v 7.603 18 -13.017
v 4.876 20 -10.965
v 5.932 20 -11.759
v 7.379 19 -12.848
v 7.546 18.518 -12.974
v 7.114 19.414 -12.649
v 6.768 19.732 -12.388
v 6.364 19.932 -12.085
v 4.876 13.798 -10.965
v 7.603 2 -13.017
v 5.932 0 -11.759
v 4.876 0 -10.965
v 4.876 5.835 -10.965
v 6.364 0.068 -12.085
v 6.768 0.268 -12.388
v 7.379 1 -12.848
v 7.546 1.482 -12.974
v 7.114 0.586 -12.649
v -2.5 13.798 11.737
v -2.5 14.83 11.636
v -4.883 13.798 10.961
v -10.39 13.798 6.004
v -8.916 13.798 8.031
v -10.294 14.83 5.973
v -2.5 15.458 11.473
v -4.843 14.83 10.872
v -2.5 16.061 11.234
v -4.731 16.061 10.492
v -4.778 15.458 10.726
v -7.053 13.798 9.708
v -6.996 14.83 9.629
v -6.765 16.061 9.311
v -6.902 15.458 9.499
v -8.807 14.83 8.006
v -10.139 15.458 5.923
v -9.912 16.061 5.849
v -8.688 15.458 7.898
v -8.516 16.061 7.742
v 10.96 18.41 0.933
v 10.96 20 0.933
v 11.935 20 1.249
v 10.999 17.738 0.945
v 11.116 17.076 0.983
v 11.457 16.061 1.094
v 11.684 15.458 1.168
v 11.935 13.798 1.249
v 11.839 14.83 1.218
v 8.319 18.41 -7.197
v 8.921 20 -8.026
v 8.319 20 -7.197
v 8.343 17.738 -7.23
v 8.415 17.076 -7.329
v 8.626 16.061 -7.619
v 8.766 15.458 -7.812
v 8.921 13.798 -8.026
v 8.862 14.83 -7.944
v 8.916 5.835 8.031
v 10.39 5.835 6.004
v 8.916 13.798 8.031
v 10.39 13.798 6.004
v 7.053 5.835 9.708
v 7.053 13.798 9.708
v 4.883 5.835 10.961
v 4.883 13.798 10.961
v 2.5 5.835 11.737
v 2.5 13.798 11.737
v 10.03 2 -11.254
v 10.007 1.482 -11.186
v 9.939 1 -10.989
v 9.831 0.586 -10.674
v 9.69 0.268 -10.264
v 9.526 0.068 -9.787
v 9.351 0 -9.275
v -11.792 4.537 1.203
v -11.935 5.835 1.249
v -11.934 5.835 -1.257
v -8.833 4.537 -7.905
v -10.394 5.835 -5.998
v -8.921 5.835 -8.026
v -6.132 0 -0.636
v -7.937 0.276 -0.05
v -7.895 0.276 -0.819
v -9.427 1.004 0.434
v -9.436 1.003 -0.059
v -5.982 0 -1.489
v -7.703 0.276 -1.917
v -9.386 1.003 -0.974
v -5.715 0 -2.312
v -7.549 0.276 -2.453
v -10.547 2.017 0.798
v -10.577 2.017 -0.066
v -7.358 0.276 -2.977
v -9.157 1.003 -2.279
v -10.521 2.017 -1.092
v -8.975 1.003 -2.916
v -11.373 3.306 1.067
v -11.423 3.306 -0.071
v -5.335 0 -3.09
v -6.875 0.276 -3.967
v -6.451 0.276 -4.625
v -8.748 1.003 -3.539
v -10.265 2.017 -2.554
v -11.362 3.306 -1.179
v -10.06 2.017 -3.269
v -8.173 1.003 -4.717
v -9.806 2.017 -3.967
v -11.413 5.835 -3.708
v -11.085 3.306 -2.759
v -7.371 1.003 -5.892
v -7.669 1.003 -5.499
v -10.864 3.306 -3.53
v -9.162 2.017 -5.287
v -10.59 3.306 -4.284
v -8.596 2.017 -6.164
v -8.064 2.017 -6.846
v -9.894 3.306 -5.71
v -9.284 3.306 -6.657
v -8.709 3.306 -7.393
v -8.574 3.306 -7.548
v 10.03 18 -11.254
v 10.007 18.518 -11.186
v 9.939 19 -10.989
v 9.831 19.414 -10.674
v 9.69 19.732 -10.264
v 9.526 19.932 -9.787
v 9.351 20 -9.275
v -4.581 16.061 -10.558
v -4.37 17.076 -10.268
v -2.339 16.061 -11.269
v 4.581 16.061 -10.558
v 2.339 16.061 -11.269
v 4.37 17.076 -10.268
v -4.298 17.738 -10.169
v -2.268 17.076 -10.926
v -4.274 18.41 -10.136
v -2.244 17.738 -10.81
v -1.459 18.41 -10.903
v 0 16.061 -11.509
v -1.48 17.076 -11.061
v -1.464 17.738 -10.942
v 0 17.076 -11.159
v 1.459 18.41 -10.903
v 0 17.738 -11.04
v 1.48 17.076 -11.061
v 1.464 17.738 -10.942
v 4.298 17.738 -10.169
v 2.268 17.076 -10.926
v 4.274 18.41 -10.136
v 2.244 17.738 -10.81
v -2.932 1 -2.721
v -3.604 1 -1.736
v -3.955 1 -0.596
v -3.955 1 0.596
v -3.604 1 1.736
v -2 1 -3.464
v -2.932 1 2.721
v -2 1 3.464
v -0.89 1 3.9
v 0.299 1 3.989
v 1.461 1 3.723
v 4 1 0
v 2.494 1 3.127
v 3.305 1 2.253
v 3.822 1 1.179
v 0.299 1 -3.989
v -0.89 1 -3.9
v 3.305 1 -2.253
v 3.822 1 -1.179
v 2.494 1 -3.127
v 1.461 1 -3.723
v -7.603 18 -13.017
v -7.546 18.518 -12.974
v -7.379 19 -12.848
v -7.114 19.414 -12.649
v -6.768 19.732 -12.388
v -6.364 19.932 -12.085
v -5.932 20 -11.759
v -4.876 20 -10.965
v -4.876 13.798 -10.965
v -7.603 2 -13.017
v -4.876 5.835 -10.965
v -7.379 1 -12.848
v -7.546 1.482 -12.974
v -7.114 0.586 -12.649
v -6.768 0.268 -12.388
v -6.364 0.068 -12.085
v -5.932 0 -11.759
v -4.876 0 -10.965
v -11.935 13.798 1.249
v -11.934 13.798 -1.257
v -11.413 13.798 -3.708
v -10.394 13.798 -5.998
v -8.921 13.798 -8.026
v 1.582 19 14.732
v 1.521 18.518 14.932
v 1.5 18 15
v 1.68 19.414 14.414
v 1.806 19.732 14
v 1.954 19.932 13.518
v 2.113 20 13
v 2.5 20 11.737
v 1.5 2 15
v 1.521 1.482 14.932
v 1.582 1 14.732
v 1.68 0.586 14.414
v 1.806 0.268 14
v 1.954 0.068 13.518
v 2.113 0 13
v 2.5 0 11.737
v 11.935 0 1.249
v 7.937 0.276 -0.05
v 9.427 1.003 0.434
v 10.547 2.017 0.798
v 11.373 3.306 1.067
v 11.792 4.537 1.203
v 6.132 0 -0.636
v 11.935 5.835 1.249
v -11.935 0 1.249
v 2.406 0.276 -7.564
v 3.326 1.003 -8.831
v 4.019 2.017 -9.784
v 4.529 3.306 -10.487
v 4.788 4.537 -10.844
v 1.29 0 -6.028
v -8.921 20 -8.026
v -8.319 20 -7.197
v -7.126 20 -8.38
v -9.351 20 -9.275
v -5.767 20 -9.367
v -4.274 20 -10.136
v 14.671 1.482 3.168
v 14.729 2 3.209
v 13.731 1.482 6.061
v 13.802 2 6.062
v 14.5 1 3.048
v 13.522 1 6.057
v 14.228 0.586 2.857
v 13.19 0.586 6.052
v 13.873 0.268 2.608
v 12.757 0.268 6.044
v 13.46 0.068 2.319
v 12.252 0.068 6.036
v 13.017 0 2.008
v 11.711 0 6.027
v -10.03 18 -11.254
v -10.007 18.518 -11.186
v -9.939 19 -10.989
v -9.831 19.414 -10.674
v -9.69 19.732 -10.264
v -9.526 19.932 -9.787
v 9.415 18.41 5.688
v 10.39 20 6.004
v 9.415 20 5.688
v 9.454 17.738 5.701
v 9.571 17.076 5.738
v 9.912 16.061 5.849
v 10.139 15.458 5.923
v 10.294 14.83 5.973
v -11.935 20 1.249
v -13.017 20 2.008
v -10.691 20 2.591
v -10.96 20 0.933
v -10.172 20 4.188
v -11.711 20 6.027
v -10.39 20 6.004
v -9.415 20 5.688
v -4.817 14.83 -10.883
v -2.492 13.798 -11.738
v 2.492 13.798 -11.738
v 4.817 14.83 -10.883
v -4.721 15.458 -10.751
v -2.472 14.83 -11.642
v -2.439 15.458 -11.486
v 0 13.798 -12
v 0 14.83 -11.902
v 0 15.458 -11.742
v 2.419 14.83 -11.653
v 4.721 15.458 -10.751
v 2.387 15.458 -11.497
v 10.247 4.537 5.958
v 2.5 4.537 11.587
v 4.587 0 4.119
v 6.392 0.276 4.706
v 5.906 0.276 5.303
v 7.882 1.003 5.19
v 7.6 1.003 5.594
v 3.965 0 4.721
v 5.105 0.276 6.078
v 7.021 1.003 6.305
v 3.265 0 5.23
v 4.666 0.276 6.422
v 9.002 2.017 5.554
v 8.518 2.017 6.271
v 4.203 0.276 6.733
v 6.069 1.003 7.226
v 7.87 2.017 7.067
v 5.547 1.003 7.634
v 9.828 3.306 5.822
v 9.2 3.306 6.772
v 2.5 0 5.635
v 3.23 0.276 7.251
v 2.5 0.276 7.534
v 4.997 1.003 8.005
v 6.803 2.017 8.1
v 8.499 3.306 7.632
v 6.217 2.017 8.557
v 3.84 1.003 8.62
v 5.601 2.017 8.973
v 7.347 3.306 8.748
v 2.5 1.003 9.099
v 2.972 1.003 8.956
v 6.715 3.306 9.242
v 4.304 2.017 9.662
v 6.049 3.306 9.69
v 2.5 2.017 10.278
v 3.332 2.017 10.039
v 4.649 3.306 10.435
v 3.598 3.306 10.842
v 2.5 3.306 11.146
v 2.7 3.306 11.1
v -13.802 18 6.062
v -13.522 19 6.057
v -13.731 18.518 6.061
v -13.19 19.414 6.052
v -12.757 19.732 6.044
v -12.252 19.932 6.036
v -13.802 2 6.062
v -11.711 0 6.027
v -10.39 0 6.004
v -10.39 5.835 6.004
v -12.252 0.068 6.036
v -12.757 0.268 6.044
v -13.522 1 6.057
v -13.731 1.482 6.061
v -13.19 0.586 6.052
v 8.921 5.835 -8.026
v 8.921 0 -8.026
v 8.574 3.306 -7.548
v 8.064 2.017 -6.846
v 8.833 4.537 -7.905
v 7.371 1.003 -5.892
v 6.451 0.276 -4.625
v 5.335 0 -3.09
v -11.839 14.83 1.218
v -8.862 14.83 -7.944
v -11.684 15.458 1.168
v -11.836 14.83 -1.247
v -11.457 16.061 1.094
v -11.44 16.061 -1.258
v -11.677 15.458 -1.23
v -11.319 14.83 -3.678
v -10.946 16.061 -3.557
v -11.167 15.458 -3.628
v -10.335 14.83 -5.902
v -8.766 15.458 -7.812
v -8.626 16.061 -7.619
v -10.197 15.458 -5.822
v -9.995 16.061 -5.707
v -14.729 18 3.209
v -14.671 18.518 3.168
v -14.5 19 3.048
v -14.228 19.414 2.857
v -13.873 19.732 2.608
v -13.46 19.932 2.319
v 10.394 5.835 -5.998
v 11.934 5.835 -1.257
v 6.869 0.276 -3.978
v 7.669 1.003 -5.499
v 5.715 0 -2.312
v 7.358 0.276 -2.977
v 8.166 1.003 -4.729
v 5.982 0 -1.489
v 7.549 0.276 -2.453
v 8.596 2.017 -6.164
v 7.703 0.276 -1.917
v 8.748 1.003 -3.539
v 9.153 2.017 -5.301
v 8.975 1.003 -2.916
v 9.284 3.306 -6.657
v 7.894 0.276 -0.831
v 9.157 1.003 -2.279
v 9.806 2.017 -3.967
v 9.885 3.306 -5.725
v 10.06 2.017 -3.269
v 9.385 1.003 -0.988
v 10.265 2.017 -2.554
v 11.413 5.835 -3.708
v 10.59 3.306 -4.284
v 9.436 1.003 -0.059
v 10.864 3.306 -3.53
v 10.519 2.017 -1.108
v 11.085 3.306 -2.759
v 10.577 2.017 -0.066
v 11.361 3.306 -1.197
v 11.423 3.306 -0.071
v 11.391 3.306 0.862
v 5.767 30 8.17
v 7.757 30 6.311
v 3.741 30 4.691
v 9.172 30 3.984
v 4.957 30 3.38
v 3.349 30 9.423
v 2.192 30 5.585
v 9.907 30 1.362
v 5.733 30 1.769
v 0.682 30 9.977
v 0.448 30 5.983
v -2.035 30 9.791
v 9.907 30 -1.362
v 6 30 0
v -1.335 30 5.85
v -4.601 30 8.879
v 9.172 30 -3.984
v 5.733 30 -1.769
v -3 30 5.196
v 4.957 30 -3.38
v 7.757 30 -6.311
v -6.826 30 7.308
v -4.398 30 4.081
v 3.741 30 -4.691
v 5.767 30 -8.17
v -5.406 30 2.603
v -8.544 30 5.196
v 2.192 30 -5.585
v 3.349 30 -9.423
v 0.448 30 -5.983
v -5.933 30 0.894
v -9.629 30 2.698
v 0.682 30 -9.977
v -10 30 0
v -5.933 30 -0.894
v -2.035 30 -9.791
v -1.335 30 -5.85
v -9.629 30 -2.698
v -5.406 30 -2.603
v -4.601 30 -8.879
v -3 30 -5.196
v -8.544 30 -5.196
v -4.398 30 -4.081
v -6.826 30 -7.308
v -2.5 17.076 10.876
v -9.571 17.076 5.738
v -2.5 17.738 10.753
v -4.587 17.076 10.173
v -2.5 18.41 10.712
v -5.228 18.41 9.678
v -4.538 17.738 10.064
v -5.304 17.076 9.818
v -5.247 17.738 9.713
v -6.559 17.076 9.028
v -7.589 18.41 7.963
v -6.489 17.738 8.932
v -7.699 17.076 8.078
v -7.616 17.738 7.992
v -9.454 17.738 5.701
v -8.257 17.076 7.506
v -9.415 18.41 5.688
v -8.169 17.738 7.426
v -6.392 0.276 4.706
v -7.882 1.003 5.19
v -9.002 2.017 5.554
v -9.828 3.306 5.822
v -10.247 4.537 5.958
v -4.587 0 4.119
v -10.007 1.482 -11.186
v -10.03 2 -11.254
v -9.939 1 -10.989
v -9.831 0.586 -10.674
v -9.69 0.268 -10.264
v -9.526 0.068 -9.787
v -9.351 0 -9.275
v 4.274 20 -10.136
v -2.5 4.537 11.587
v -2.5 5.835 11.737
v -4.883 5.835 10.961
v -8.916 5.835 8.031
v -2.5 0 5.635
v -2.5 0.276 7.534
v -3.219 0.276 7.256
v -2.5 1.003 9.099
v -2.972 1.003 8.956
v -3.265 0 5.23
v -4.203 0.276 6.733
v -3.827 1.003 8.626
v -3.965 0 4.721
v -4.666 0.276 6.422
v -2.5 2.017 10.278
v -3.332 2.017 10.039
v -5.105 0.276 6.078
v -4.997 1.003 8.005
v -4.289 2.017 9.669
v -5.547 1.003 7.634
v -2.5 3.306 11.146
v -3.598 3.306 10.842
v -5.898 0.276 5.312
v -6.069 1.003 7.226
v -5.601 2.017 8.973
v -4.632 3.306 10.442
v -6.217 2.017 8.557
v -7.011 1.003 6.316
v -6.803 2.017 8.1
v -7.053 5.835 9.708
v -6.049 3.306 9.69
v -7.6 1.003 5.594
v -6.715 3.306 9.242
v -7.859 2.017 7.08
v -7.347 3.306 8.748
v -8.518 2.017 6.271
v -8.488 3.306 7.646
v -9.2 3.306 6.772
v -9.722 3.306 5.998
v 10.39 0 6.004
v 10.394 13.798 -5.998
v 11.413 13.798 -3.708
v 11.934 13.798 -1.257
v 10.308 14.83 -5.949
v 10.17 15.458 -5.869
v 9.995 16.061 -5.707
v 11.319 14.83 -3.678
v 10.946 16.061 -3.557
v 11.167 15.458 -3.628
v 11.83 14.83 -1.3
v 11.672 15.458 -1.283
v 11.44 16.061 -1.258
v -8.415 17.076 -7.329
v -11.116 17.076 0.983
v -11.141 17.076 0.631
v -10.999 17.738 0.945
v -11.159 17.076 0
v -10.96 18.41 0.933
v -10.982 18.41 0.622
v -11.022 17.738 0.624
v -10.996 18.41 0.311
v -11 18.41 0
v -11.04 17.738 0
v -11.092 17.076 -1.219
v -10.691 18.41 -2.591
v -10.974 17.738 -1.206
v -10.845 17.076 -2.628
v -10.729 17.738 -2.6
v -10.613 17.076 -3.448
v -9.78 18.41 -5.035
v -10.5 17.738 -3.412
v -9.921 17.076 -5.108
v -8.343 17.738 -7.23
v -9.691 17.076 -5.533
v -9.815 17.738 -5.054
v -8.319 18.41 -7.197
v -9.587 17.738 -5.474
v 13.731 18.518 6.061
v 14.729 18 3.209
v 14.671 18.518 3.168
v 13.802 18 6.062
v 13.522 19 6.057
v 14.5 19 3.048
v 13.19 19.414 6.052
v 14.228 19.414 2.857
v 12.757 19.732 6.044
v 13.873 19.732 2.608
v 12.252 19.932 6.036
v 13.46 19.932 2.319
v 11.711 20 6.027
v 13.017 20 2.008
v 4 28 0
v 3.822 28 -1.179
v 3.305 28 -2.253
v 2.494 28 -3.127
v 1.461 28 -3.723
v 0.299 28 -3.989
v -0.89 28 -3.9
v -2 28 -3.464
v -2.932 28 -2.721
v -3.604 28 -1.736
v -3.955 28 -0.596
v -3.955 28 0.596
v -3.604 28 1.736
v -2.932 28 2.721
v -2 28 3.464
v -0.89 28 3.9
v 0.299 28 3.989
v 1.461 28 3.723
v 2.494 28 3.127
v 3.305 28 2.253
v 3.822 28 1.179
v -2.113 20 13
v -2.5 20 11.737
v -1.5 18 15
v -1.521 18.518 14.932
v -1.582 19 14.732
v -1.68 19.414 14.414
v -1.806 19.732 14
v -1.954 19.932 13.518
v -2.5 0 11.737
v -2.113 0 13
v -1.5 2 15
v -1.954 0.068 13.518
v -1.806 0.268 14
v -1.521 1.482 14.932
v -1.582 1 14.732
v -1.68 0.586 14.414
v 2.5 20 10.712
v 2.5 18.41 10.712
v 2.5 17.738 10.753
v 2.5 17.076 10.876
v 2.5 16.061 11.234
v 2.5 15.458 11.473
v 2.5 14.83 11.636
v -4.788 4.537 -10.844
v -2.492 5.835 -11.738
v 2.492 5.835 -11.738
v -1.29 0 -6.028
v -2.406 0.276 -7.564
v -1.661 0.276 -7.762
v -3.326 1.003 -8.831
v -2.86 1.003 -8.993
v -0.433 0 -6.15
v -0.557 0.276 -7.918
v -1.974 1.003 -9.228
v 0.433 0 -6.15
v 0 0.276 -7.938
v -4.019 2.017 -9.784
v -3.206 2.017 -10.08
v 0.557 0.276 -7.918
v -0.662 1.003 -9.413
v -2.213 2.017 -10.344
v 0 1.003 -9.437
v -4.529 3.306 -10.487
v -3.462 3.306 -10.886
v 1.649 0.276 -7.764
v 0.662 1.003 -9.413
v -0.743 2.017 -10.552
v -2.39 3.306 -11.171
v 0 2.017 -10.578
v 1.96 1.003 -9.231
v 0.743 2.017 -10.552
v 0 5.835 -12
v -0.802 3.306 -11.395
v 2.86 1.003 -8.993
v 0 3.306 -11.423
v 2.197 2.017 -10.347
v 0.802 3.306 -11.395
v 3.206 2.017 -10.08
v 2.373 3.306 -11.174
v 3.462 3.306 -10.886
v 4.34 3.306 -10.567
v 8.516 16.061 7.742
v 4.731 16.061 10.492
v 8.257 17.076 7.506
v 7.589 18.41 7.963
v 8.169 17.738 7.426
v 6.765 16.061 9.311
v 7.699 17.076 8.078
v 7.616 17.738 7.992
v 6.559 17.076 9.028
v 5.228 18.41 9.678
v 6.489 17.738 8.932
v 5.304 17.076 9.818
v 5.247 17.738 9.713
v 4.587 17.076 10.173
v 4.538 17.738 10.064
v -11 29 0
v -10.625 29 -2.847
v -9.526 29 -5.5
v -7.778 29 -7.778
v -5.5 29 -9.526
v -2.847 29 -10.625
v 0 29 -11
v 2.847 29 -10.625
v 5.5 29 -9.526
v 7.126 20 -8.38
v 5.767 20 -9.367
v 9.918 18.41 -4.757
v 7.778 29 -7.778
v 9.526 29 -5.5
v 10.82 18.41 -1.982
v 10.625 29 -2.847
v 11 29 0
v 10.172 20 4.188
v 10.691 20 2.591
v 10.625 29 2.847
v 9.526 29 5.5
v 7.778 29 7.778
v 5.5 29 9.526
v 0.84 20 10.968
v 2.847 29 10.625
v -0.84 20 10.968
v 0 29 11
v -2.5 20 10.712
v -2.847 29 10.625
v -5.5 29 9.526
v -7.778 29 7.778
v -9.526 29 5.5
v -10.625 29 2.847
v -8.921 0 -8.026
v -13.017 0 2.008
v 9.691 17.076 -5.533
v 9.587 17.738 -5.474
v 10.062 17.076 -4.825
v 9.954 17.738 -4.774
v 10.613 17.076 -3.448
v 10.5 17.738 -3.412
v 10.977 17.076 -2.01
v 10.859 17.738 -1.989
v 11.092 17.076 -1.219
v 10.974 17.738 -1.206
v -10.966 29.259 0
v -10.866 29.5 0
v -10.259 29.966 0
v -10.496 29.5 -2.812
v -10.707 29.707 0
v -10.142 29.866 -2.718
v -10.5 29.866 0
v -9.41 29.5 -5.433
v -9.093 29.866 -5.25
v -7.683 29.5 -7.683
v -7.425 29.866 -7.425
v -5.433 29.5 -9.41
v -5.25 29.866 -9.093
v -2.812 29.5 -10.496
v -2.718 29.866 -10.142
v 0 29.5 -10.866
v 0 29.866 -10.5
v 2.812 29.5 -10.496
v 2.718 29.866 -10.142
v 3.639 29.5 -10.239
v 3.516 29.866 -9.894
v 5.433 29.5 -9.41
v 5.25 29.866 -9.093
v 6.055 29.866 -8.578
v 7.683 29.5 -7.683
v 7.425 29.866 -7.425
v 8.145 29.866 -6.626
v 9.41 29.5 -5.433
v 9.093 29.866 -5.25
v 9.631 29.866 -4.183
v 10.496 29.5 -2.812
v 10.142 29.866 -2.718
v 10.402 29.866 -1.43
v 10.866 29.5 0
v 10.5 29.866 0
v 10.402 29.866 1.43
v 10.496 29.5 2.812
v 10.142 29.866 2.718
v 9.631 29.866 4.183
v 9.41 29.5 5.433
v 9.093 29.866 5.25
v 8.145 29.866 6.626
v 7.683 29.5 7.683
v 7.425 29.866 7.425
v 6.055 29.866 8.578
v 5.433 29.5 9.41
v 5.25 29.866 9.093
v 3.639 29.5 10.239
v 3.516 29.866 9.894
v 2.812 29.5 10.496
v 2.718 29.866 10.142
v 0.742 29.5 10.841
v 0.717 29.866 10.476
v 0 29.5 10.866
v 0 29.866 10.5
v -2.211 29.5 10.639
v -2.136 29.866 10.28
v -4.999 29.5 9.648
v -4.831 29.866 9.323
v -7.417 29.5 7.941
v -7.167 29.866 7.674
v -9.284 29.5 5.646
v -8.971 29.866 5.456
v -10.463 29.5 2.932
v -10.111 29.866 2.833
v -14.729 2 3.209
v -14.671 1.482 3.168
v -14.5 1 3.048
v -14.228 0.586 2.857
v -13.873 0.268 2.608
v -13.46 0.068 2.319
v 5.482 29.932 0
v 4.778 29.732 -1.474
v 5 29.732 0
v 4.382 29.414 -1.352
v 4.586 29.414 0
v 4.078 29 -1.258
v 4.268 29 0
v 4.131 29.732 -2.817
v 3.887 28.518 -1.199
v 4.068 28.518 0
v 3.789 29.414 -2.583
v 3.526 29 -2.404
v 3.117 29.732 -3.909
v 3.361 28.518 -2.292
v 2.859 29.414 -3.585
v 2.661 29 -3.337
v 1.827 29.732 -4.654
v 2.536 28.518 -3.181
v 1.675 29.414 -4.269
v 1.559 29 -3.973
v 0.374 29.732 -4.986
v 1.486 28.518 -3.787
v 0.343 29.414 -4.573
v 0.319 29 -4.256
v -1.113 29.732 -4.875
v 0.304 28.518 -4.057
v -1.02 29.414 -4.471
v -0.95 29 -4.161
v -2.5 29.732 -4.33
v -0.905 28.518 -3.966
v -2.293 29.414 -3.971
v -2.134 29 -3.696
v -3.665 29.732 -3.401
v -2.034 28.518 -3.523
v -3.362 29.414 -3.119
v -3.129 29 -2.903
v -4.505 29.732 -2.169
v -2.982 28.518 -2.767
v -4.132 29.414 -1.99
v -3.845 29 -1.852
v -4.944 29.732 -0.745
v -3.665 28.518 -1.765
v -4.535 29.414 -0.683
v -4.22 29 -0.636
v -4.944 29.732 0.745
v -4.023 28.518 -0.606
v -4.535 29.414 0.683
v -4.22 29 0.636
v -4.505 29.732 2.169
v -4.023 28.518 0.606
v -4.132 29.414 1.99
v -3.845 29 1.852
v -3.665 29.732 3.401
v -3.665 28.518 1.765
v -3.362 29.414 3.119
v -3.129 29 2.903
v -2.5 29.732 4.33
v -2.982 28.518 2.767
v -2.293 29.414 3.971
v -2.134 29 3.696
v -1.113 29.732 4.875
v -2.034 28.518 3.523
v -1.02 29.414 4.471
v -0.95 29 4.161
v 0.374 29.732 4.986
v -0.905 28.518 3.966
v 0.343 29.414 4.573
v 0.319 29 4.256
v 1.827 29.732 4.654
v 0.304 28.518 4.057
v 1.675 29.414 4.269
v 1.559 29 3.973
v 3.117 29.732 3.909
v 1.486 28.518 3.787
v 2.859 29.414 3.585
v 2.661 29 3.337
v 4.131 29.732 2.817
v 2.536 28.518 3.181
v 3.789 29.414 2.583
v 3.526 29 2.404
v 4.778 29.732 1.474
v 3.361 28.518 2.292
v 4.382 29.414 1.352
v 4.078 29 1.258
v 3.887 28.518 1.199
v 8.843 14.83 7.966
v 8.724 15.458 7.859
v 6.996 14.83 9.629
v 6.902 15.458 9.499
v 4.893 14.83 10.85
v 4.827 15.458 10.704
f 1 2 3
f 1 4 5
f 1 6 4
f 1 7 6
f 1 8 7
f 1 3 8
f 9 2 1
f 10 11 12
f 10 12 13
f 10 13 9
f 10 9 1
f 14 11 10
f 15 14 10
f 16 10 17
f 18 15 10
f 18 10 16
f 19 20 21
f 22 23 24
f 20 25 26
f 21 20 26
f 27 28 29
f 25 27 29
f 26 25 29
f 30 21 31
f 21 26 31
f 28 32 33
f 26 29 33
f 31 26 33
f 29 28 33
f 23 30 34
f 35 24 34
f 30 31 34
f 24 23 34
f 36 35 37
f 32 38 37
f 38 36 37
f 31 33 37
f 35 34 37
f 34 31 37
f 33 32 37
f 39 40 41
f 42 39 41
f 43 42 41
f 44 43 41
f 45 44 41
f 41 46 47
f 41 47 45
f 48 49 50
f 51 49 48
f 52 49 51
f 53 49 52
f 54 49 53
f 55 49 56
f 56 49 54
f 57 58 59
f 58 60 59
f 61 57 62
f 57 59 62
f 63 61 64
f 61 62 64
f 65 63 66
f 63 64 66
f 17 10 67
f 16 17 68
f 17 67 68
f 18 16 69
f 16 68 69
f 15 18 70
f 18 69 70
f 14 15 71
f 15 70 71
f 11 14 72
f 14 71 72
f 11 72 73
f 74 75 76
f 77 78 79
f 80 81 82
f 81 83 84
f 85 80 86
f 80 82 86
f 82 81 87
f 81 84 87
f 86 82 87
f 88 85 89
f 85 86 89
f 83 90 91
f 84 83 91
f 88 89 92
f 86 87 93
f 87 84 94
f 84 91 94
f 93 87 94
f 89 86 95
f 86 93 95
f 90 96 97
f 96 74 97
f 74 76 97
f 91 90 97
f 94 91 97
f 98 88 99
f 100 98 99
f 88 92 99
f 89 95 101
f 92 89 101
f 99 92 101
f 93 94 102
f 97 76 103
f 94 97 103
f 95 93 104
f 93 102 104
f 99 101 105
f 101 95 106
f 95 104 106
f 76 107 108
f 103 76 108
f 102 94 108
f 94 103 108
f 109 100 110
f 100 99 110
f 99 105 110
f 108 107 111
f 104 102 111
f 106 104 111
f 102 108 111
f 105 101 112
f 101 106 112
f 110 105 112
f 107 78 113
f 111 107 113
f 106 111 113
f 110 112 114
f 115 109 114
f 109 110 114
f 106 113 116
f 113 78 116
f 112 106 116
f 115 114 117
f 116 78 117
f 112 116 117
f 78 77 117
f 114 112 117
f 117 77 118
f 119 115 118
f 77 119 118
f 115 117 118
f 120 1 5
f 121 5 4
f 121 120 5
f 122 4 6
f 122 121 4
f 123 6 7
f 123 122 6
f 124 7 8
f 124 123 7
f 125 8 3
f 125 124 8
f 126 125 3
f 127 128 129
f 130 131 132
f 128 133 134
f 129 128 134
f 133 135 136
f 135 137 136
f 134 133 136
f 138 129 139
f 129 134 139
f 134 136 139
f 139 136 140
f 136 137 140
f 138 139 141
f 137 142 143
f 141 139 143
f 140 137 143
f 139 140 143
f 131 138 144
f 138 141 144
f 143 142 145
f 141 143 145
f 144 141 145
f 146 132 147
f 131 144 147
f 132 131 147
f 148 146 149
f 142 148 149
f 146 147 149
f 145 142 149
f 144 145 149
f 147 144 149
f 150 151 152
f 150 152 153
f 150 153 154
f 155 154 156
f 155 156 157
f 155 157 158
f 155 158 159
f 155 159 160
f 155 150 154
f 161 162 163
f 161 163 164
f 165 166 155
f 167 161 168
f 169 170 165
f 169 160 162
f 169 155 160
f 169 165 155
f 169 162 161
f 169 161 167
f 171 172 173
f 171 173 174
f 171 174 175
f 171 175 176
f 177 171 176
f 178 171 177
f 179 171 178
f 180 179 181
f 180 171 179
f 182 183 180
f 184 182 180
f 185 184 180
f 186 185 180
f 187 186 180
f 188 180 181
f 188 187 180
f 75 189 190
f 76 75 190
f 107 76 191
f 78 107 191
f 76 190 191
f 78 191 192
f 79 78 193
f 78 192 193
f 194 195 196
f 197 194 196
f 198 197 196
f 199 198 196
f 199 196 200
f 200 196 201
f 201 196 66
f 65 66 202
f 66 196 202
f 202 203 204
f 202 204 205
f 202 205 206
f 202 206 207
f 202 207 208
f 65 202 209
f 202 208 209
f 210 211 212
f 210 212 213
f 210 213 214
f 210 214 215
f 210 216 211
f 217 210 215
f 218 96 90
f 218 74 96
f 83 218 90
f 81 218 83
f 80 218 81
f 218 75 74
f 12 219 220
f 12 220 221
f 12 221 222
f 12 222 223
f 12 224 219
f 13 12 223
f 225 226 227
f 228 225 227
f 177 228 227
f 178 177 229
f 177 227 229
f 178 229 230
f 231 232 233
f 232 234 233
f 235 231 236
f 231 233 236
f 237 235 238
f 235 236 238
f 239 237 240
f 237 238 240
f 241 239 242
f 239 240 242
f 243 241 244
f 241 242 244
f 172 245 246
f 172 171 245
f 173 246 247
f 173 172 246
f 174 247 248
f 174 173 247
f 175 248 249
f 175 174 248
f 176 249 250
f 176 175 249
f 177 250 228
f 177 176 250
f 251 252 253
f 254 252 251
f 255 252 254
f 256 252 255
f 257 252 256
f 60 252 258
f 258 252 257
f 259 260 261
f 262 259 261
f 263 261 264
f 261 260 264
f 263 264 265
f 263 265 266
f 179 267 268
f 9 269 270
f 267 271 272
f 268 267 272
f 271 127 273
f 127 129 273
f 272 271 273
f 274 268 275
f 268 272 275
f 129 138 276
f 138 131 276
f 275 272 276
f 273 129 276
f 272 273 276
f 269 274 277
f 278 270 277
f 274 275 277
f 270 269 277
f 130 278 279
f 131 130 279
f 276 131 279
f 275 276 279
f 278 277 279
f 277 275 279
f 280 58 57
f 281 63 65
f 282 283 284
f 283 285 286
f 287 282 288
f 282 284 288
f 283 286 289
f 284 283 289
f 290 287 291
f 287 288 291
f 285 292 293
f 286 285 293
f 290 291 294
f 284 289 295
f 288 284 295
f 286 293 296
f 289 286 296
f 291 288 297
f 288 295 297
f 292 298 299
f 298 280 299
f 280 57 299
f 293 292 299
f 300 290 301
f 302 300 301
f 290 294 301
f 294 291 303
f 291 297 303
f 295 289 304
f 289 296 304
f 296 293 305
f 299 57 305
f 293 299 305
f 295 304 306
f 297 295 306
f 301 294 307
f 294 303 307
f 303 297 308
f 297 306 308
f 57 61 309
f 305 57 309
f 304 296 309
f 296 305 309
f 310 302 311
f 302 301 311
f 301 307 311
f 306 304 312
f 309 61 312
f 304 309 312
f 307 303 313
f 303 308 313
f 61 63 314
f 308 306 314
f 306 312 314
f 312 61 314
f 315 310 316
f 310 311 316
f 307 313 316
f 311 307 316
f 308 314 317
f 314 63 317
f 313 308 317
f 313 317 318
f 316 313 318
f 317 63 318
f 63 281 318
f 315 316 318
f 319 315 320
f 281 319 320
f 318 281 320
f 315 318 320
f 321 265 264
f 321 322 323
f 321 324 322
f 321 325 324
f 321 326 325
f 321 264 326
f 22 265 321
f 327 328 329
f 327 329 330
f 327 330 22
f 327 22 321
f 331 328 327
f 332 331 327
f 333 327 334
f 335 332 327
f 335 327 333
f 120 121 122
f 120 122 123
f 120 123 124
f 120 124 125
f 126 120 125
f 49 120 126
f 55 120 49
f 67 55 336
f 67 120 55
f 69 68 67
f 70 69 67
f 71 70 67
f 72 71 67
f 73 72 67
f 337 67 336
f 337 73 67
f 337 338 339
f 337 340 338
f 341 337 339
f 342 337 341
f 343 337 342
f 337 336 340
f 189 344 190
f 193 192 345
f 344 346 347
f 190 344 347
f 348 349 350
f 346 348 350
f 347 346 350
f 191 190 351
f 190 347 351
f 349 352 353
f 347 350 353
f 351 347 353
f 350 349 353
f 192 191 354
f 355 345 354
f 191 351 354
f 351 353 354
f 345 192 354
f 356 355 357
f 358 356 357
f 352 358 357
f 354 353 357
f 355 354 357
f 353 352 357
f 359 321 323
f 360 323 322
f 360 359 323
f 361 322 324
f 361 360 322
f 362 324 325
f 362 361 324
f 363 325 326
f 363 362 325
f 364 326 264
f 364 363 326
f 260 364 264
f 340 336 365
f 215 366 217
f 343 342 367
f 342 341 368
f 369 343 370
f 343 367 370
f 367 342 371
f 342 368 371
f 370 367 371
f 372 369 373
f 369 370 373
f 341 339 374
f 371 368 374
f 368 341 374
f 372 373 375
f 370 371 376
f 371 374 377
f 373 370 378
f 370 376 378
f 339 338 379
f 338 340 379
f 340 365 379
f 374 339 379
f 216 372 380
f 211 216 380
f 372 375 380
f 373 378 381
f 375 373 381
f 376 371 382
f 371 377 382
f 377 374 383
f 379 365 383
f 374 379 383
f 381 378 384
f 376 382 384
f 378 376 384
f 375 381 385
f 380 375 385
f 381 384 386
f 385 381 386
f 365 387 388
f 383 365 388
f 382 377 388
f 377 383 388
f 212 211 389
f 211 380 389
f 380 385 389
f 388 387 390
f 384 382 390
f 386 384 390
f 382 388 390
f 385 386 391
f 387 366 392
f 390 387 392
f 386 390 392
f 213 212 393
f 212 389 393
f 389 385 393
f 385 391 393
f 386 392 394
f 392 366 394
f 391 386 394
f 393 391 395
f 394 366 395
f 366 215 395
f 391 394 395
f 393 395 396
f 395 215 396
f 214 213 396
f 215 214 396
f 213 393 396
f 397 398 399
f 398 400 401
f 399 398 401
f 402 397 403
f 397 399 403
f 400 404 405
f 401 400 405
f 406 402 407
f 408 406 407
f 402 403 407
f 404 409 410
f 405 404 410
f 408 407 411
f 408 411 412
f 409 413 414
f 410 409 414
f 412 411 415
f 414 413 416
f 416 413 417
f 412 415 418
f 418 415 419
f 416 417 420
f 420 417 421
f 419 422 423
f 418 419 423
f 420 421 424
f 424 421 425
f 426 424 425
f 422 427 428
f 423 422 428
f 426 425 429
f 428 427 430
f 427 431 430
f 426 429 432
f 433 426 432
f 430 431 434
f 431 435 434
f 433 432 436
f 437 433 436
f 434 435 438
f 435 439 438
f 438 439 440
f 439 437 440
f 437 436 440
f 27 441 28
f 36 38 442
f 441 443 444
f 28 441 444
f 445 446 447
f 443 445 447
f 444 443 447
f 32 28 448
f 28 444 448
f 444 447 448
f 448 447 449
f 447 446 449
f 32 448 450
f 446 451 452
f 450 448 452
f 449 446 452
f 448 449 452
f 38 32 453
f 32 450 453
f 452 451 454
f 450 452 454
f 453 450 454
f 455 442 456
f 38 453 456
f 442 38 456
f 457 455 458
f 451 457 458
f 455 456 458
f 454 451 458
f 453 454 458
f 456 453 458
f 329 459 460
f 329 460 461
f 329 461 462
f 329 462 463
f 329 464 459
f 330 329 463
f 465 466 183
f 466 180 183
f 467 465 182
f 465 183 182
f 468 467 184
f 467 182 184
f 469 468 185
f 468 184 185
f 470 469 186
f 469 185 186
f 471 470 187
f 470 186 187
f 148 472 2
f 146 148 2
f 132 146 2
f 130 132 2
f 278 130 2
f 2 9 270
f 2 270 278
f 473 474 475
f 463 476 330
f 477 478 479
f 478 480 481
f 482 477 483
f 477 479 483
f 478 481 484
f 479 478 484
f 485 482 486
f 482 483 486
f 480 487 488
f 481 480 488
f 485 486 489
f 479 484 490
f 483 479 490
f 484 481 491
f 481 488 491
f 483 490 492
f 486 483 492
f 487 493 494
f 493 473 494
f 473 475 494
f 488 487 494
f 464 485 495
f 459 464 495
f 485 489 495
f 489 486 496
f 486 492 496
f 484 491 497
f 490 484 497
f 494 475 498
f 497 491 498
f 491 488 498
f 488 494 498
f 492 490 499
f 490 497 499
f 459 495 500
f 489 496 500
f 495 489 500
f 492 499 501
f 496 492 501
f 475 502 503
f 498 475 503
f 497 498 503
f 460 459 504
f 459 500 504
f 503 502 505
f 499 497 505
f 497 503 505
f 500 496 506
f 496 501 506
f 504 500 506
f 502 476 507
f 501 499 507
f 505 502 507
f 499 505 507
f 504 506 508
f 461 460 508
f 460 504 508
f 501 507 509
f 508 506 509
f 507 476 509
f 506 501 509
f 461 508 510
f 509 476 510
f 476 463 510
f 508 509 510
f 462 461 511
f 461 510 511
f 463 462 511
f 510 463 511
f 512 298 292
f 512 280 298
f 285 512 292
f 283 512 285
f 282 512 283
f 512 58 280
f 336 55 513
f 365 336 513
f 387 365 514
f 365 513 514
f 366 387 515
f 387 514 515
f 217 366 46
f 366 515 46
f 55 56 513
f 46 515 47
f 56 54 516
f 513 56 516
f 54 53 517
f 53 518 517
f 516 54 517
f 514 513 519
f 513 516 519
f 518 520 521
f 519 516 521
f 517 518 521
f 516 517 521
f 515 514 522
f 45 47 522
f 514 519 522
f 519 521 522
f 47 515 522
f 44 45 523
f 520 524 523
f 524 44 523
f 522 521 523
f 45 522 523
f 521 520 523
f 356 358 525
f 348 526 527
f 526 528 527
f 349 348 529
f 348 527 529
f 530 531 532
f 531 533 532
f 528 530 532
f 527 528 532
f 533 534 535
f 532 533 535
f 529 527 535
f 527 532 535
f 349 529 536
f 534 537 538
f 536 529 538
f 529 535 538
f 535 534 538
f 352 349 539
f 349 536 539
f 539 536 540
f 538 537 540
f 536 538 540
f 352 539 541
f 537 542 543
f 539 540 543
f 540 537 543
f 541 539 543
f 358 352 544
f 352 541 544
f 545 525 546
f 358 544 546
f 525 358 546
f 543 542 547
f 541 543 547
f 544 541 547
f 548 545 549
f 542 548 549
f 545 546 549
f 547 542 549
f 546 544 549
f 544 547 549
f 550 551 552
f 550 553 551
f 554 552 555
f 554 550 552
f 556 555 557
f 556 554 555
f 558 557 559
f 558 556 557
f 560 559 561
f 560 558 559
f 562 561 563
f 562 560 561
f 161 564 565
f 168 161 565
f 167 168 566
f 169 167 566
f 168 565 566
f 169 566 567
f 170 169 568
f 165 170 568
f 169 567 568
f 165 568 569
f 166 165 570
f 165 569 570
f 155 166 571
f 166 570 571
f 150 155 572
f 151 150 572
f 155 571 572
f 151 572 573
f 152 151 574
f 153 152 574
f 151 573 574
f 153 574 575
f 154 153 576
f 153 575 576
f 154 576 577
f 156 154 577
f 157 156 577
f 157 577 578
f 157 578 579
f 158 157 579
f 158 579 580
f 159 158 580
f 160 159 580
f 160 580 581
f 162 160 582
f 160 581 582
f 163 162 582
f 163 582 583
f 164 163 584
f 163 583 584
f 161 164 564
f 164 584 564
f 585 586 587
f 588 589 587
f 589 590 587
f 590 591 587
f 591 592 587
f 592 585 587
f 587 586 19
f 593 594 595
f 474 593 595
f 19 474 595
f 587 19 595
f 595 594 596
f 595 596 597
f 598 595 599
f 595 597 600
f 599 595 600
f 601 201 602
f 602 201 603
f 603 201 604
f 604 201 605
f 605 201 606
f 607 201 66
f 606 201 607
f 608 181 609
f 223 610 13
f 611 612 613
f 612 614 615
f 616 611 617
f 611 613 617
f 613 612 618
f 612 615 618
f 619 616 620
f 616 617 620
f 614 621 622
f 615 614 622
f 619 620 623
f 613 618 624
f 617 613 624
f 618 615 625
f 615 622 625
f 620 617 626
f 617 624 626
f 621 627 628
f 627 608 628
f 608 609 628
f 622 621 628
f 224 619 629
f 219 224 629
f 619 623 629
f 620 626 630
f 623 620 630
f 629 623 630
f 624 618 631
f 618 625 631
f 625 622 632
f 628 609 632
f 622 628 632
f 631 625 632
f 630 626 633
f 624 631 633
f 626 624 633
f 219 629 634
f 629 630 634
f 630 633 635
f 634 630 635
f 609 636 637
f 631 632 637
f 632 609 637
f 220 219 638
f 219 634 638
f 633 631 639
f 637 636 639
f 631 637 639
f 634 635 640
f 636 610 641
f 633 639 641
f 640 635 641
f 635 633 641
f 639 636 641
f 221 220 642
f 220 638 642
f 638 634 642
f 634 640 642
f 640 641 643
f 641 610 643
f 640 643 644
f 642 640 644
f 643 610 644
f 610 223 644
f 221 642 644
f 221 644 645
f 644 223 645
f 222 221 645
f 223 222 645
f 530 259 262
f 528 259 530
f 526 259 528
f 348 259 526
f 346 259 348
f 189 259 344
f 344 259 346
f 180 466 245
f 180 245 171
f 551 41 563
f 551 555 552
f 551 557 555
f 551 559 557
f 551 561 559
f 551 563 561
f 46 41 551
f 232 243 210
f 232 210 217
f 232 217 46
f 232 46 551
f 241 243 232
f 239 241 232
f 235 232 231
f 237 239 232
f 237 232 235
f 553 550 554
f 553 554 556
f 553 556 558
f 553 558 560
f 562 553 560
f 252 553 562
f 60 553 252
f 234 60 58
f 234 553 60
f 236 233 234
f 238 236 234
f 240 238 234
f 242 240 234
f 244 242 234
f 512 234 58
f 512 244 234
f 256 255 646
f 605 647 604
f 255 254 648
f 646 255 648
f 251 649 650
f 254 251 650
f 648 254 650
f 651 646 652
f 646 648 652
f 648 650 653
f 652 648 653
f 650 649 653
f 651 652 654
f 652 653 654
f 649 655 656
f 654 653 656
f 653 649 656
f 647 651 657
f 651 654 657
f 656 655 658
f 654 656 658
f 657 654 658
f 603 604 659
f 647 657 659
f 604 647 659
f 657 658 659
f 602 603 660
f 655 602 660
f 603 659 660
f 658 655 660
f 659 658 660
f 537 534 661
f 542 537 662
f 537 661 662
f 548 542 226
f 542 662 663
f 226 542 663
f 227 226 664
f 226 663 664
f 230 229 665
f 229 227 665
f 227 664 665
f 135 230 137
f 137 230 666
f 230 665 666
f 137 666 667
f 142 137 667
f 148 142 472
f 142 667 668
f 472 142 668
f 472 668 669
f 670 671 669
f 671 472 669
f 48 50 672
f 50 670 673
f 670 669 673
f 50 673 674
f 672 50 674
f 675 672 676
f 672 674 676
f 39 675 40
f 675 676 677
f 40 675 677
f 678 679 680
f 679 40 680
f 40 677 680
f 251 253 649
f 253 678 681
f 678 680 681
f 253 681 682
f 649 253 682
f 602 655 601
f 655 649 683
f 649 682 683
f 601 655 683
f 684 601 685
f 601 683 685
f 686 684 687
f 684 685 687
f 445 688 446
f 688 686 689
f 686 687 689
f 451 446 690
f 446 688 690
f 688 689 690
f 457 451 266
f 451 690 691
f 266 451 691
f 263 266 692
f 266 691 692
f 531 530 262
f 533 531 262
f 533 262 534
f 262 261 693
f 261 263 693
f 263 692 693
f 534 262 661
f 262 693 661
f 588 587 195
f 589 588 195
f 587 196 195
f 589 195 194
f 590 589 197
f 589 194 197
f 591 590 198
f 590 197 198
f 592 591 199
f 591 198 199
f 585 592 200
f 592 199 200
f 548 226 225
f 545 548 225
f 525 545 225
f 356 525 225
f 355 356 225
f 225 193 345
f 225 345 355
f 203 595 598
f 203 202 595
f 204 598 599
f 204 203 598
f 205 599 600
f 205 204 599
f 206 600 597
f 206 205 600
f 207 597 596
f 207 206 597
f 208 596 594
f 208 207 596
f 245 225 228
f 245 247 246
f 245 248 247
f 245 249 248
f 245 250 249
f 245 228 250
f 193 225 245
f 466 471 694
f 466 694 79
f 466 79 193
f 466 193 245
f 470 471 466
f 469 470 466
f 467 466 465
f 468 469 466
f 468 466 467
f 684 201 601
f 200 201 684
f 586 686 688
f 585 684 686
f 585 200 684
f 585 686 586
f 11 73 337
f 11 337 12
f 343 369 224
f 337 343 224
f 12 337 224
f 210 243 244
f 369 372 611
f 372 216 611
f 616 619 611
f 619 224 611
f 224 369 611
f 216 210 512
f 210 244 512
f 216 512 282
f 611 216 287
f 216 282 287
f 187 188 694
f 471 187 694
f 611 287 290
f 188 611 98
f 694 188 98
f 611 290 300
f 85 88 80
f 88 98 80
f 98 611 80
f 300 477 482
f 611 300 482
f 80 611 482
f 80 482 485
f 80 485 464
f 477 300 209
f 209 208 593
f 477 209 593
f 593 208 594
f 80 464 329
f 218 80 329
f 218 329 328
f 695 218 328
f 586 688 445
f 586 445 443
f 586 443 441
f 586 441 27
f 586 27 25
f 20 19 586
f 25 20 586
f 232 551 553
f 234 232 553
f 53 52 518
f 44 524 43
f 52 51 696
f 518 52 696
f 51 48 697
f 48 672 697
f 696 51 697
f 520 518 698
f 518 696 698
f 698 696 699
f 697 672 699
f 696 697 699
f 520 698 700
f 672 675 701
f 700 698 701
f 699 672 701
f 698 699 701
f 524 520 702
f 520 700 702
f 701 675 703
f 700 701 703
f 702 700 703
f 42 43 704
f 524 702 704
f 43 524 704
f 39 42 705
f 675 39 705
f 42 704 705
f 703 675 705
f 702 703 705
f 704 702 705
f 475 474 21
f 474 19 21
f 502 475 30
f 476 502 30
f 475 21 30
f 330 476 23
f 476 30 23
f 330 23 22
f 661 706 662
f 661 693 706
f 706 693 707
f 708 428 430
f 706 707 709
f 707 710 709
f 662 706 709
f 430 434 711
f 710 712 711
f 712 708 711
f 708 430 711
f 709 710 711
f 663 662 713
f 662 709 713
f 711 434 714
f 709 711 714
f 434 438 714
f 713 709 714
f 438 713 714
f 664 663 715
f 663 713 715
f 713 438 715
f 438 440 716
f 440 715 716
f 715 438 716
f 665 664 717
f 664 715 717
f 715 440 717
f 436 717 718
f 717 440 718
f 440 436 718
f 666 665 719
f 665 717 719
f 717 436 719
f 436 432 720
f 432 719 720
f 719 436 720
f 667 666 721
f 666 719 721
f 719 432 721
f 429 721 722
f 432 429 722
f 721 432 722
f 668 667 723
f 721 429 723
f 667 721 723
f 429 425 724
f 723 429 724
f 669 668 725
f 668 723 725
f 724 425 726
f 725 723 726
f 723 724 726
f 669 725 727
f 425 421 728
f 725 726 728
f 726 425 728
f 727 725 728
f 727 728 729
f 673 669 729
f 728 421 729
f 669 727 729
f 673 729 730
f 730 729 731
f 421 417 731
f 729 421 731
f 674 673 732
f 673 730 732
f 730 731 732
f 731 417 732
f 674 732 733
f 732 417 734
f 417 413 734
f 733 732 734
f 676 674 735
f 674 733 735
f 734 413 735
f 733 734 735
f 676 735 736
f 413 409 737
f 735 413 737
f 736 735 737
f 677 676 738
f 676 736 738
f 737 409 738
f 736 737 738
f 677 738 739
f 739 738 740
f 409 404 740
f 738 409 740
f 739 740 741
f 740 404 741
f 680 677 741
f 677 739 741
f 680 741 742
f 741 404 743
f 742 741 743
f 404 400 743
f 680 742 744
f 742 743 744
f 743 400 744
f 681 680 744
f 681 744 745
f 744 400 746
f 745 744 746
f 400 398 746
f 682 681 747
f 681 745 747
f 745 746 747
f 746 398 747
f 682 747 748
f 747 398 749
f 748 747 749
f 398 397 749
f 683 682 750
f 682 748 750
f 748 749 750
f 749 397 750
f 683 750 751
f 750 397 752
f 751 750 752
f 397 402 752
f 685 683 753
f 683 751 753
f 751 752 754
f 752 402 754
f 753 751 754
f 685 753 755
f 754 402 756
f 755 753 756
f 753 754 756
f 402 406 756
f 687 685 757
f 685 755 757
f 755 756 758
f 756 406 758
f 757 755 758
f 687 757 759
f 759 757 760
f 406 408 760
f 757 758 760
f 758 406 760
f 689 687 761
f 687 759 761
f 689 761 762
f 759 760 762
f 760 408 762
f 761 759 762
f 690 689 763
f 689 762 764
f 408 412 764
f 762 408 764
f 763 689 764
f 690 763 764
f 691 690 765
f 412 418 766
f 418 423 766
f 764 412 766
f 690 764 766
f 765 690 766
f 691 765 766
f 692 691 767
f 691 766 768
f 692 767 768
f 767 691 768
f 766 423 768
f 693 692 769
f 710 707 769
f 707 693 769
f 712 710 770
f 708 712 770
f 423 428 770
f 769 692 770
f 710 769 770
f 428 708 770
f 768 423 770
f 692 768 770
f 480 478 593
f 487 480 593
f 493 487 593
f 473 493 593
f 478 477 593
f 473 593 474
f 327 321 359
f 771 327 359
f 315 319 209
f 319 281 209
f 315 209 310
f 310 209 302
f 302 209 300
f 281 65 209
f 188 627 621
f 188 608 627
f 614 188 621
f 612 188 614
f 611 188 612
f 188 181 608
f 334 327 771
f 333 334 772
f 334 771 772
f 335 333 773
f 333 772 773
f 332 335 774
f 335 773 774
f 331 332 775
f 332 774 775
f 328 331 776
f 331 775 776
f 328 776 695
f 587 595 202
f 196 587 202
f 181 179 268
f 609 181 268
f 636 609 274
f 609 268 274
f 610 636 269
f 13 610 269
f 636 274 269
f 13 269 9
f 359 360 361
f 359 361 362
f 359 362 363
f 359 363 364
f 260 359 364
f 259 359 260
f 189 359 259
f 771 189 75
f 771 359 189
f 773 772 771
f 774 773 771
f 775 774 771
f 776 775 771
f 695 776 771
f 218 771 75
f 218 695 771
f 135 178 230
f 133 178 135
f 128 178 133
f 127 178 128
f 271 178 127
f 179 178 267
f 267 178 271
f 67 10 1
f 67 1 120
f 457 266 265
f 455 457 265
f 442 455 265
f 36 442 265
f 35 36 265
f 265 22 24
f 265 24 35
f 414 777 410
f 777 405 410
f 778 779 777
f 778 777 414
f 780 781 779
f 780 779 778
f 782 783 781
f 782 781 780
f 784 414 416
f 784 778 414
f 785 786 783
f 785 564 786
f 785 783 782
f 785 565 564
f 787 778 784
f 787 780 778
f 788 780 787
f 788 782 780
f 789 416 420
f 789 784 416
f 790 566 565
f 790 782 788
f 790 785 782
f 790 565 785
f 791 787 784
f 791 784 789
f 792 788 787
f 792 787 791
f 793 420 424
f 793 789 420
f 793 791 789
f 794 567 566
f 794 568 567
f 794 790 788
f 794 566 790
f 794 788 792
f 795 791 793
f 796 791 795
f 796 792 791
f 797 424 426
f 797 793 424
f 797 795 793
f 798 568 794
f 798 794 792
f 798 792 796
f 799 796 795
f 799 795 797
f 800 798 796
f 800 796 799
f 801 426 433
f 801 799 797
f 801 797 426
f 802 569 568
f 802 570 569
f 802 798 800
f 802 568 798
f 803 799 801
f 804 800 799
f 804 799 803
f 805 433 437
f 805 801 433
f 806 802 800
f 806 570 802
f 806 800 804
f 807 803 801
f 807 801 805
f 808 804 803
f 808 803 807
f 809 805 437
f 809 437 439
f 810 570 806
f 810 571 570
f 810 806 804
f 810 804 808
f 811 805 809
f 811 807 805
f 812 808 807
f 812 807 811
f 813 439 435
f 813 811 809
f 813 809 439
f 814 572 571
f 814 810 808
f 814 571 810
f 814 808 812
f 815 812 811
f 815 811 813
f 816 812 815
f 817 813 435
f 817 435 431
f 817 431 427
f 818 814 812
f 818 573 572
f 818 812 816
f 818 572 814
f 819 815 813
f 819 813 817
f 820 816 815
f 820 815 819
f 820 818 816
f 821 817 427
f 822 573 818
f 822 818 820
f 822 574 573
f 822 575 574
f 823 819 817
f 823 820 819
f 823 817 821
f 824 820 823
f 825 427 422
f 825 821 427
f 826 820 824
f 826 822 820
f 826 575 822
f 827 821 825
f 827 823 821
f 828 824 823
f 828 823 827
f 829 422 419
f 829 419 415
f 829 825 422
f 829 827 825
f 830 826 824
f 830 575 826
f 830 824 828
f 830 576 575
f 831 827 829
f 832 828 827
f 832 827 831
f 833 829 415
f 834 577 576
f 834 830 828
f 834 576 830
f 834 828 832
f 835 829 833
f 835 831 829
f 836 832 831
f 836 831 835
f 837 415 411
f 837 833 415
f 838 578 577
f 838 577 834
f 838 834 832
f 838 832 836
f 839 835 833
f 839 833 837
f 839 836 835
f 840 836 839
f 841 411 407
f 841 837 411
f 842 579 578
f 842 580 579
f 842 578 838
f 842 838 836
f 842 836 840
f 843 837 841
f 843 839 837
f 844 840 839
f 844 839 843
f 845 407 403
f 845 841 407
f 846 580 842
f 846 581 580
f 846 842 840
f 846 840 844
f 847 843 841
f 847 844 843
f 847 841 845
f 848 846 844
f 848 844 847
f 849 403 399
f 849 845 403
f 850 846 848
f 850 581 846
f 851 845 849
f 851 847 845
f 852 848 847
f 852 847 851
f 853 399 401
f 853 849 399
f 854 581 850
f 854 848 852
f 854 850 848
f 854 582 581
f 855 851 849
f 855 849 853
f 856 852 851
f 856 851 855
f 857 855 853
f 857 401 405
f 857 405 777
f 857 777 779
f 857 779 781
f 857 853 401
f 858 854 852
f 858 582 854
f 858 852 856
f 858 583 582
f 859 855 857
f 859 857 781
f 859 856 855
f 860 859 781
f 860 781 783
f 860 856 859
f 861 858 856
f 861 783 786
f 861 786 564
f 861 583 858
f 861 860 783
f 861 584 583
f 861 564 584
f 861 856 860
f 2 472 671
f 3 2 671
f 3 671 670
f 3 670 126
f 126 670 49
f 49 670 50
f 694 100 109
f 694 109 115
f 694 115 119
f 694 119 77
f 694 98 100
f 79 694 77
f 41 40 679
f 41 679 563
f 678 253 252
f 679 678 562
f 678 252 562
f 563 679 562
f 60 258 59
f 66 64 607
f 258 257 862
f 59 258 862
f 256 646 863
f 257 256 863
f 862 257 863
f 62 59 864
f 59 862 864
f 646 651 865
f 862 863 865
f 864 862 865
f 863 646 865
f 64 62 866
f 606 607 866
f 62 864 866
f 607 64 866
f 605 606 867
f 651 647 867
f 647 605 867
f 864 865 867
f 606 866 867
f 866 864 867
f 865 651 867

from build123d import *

# Parameters (mm, degrees)
SKETCH3_R           = 4
CUT_EXTRUDE2_DEPTH  = 29
FILLET2_R           = 2
BOSS_EXTRUDE1_DEPTH = 20
FILLET3_R           = 2


with BuildPart() as part:
    # Sketch1 → Revolve1 (revolve)
    with BuildSketch(Plane.XY):
        with BuildLine():
            Line((0, 30), (0, 0))
            Line((0, 0), (-6.164929537, 0))
            ThreePointArc((-6.164929537, 0), (-10.29094743, 1.70905257), (-12, 5.835070463))
            Line((-12, 5.835070463), (-12, 13.798025689))
            ThreePointArc((-12, 13.798025689), (-11.875902596, 14.955923247), (-11.50924738, 16.061224505))
            ThreePointArc((-11.50924738, 16.061224505), (-11.128774204, 17.208180724), (-11, 18.409715414))
            Line((-11, 18.409715414), (-11, 29))
            ThreePointArc((-11, 29), (-10.707106781, 29.707106781), (-10, 30))
            Line((-10, 30), (0, 30))
        make_face()
    revolve(axis=Axis((0, 30, 0), (0, -1, 0)))

    # Sketch3 → Cut-Extrude2 (cut)
    with BuildSketch(Plane(origin=(0, 30, 0), x_dir=(1, 0, 0), z_dir=(0, 1, 0))):
        Circle(SKETCH3_R)
    extrude(amount=-CUT_EXTRUDE2_DEPTH, mode=Mode.SUBTRACT)

    # Fillet2
    fillet2_edges = [part.edges().sort_by_distance(p)[0] for p in [
        (-4, 30, 0),
    ]]
    fillet(fillet2_edges, radius=FILLET2_R)

    # Sketch2 → Boss-Extrude1 (add)
    with BuildSketch(Plane.XZ):
        Polygon((-1.5, 15), (1.5, 15), (2.5, 11.736694594), (2.5, 5.635277828), (-2.5, 5.635277828), (-2.5, 11.736694594), align=None)
        Polygon((10.389717388, 6.004479378), (4.586925213, 4.119037908), (6.132010185, -0.636244674), (11.93480236, 1.249196797), (14.729373236, 3.208670141), (13.802322253, 6.06183969), align=None)
        Polygon((8.921198479, -8.025722254), (5.334875686, -3.0895724), (1.289790714, -6.028498661), (4.876113507, -10.964648515), (7.603253293, -13.016932794), (10.030304276, -11.253577037), align=None)
        Polygon((-4.876113507, -10.964648515), (-1.289790714, -6.028498661), (-5.334875686, -3.0895724), (-8.921198479, -8.025722254), (-10.030304276, -11.253577037), (-7.603253293, -13.016932794), align=None)
        Polygon((-11.93480236, 1.249196797), (-6.132010185, -0.636244674), (-4.586925213, 4.119037908), (-10.389717388, 6.004479378), (-13.802322253, 6.06183969), (-14.729373236, 3.208670141), align=None)
    extrude(amount=-BOSS_EXTRUDE1_DEPTH)

    # Fillet3
    fillet3_edges = [part.edges().sort_by_distance(p)[0] for p in [
        (-8.816778784, 20, -12.135254916),
        (-8.816778784, 0, -12.135254916),
        (-14.265847744, 20, 4.635254916),
        (-14.265847744, 0, 4.635254916),
        (0, 20, 15),
        (0, 0, 15),
        (14.265847744, 20, 4.635254916),
        (14.265847744, 0, 4.635254916),
        (8.816778784, 20, -12.135254916),
        (8.816778784, 0, -12.135254916),
    ]]
    fillet(fillet3_edges, radius=FILLET3_R)


solid = part.part
